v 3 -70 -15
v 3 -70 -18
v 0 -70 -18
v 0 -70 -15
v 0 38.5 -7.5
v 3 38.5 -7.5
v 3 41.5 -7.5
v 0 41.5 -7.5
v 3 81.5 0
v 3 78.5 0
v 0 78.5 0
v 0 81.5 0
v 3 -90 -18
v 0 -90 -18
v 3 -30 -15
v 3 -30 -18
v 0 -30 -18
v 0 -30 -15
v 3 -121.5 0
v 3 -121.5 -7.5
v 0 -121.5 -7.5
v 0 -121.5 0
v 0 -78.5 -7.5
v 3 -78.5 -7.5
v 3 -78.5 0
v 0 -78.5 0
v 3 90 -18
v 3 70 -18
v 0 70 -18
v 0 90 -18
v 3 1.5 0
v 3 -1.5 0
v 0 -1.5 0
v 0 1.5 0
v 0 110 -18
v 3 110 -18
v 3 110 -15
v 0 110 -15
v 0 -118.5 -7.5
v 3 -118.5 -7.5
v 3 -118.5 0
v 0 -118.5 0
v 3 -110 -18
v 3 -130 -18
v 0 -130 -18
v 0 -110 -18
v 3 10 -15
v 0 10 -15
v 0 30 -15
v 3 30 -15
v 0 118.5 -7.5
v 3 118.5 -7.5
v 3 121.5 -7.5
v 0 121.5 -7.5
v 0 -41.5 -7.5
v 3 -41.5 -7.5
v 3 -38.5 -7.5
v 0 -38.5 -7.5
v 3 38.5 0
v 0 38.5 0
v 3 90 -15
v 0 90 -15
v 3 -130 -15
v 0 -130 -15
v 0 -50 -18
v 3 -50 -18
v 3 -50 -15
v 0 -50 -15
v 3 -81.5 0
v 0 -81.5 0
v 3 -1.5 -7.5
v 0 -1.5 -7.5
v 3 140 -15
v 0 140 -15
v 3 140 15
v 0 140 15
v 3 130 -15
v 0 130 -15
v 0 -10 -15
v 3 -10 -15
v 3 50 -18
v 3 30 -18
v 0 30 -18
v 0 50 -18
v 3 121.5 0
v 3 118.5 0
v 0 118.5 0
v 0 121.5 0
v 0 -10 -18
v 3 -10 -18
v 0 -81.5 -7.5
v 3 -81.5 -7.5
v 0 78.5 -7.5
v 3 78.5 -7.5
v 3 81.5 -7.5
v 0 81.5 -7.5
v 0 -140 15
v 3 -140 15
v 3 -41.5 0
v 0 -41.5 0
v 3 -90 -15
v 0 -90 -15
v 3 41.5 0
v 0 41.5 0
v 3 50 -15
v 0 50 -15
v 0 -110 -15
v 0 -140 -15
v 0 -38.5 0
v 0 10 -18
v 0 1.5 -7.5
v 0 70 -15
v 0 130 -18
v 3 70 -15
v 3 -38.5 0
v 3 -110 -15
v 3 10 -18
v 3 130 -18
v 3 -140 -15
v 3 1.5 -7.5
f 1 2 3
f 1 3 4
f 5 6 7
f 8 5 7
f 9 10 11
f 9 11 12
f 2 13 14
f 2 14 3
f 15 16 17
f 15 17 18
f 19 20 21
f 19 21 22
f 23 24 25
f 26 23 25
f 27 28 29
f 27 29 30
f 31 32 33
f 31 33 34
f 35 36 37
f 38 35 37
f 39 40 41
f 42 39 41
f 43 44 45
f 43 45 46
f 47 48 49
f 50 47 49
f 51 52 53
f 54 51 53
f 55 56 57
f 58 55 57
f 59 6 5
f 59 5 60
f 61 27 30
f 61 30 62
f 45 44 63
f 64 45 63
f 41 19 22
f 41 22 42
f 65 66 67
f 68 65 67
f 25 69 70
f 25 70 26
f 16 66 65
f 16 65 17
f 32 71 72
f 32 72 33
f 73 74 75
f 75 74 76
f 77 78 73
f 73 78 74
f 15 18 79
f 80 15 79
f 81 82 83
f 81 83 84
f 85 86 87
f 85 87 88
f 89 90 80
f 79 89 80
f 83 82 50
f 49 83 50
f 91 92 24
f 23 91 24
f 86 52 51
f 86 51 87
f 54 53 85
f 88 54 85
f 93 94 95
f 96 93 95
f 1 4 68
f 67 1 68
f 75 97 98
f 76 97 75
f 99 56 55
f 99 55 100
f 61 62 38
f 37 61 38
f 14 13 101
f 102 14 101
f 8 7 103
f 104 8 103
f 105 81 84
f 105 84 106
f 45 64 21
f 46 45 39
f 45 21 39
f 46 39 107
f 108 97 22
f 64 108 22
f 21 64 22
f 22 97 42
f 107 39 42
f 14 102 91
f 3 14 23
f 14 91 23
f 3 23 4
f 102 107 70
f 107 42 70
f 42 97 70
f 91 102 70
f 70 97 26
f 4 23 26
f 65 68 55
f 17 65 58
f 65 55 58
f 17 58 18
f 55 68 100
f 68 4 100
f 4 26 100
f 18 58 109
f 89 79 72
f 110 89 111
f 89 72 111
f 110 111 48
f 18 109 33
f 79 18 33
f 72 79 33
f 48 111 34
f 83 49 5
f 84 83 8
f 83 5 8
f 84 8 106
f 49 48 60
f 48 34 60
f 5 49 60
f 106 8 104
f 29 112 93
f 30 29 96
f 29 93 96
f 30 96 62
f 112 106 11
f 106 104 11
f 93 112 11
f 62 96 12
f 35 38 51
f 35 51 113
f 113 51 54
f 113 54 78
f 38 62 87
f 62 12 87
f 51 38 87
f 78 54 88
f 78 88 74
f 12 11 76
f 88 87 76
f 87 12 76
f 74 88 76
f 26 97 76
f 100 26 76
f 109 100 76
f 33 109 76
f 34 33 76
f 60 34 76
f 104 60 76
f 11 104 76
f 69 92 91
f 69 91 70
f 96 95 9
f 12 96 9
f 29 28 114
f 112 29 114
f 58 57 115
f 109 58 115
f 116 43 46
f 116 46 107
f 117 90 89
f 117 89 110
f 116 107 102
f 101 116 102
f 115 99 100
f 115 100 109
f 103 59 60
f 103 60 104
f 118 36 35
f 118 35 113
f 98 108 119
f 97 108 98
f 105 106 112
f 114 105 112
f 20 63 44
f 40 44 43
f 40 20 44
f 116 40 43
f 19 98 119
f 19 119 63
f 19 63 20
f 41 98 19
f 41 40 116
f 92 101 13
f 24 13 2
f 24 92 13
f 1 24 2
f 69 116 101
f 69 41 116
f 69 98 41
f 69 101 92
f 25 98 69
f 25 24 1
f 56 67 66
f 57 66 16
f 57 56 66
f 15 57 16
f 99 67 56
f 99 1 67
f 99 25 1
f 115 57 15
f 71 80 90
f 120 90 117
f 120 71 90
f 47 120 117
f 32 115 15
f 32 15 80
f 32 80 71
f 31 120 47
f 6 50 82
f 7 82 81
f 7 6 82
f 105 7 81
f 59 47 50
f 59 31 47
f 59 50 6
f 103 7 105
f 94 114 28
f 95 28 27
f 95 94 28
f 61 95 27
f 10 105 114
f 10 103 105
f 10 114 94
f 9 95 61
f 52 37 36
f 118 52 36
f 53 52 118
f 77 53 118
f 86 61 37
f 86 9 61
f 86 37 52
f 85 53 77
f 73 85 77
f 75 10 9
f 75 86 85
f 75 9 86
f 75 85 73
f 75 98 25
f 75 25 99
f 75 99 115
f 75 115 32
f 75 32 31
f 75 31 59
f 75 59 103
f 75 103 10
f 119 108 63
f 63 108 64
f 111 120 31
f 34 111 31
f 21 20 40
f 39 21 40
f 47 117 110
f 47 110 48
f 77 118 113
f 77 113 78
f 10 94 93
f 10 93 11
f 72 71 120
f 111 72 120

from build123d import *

# Parameters (mm, degrees)
F0_W     = 280
F0_H     = 30
F1_DEPTH = 3
F2_W     = 20
F2_H     = 3
F3_DEPTH = 3
F4_W     = 3
F4_H     = 7.5
F5_DEPTH = 25


with BuildPart() as f1:
    # F0 (on Right) → F1 (new body)
    with BuildSketch(Plane.YZ):
        Rectangle(F0_W, F0_H)
    extrude(amount=F1_DEPTH)

    # F2 (on face) → F3 (join, through all)
    with BuildSketch(Plane.YZ.offset(3)):
        with Locations((120, -16.5)):
            Rectangle(F2_W, F2_H)
        with Locations((80, -16.5)):
            Rectangle(F2_W, F2_H)
        with Locations((40, -16.5)):
            Rectangle(F2_W, F2_H)
        with Locations((0, -16.5)):
            Rectangle(F2_W, F2_H)
        with Locations((-40, -16.5)):
            Rectangle(F2_W, F2_H)
        with Locations((-80, -16.5)):
            Rectangle(F2_W, F2_H)
        with Locations((-120, -16.5)):
            Rectangle(F2_W, F2_H)
    extrude(amount=-F3_DEPTH)

    # F4 (on face) → F5 (cut)
    with BuildSketch(Plane.YZ.offset(3)):
        with Locations((120, -3.75)):
            Rectangle(F4_W, F4_H)
        with Locations((80, -3.75)):
            Rectangle(F4_W, F4_H)
        with Locations((40, -3.75)):
            Rectangle(F4_W, F4_H)
        with Locations((0, -3.75)):
            Rectangle(F4_W, F4_H)
        with Locations((-40, -3.75)):
            Rectangle(F4_W, F4_H)
        with Locations((-80, -3.75)):
            Rectangle(F4_W, F4_H)
        with Locations((-120, -3.75)):
            Rectangle(F4_W, F4_H)
    extrude(amount=-F5_DEPTH, mode=Mode.SUBTRACT)


solid = f1.part
